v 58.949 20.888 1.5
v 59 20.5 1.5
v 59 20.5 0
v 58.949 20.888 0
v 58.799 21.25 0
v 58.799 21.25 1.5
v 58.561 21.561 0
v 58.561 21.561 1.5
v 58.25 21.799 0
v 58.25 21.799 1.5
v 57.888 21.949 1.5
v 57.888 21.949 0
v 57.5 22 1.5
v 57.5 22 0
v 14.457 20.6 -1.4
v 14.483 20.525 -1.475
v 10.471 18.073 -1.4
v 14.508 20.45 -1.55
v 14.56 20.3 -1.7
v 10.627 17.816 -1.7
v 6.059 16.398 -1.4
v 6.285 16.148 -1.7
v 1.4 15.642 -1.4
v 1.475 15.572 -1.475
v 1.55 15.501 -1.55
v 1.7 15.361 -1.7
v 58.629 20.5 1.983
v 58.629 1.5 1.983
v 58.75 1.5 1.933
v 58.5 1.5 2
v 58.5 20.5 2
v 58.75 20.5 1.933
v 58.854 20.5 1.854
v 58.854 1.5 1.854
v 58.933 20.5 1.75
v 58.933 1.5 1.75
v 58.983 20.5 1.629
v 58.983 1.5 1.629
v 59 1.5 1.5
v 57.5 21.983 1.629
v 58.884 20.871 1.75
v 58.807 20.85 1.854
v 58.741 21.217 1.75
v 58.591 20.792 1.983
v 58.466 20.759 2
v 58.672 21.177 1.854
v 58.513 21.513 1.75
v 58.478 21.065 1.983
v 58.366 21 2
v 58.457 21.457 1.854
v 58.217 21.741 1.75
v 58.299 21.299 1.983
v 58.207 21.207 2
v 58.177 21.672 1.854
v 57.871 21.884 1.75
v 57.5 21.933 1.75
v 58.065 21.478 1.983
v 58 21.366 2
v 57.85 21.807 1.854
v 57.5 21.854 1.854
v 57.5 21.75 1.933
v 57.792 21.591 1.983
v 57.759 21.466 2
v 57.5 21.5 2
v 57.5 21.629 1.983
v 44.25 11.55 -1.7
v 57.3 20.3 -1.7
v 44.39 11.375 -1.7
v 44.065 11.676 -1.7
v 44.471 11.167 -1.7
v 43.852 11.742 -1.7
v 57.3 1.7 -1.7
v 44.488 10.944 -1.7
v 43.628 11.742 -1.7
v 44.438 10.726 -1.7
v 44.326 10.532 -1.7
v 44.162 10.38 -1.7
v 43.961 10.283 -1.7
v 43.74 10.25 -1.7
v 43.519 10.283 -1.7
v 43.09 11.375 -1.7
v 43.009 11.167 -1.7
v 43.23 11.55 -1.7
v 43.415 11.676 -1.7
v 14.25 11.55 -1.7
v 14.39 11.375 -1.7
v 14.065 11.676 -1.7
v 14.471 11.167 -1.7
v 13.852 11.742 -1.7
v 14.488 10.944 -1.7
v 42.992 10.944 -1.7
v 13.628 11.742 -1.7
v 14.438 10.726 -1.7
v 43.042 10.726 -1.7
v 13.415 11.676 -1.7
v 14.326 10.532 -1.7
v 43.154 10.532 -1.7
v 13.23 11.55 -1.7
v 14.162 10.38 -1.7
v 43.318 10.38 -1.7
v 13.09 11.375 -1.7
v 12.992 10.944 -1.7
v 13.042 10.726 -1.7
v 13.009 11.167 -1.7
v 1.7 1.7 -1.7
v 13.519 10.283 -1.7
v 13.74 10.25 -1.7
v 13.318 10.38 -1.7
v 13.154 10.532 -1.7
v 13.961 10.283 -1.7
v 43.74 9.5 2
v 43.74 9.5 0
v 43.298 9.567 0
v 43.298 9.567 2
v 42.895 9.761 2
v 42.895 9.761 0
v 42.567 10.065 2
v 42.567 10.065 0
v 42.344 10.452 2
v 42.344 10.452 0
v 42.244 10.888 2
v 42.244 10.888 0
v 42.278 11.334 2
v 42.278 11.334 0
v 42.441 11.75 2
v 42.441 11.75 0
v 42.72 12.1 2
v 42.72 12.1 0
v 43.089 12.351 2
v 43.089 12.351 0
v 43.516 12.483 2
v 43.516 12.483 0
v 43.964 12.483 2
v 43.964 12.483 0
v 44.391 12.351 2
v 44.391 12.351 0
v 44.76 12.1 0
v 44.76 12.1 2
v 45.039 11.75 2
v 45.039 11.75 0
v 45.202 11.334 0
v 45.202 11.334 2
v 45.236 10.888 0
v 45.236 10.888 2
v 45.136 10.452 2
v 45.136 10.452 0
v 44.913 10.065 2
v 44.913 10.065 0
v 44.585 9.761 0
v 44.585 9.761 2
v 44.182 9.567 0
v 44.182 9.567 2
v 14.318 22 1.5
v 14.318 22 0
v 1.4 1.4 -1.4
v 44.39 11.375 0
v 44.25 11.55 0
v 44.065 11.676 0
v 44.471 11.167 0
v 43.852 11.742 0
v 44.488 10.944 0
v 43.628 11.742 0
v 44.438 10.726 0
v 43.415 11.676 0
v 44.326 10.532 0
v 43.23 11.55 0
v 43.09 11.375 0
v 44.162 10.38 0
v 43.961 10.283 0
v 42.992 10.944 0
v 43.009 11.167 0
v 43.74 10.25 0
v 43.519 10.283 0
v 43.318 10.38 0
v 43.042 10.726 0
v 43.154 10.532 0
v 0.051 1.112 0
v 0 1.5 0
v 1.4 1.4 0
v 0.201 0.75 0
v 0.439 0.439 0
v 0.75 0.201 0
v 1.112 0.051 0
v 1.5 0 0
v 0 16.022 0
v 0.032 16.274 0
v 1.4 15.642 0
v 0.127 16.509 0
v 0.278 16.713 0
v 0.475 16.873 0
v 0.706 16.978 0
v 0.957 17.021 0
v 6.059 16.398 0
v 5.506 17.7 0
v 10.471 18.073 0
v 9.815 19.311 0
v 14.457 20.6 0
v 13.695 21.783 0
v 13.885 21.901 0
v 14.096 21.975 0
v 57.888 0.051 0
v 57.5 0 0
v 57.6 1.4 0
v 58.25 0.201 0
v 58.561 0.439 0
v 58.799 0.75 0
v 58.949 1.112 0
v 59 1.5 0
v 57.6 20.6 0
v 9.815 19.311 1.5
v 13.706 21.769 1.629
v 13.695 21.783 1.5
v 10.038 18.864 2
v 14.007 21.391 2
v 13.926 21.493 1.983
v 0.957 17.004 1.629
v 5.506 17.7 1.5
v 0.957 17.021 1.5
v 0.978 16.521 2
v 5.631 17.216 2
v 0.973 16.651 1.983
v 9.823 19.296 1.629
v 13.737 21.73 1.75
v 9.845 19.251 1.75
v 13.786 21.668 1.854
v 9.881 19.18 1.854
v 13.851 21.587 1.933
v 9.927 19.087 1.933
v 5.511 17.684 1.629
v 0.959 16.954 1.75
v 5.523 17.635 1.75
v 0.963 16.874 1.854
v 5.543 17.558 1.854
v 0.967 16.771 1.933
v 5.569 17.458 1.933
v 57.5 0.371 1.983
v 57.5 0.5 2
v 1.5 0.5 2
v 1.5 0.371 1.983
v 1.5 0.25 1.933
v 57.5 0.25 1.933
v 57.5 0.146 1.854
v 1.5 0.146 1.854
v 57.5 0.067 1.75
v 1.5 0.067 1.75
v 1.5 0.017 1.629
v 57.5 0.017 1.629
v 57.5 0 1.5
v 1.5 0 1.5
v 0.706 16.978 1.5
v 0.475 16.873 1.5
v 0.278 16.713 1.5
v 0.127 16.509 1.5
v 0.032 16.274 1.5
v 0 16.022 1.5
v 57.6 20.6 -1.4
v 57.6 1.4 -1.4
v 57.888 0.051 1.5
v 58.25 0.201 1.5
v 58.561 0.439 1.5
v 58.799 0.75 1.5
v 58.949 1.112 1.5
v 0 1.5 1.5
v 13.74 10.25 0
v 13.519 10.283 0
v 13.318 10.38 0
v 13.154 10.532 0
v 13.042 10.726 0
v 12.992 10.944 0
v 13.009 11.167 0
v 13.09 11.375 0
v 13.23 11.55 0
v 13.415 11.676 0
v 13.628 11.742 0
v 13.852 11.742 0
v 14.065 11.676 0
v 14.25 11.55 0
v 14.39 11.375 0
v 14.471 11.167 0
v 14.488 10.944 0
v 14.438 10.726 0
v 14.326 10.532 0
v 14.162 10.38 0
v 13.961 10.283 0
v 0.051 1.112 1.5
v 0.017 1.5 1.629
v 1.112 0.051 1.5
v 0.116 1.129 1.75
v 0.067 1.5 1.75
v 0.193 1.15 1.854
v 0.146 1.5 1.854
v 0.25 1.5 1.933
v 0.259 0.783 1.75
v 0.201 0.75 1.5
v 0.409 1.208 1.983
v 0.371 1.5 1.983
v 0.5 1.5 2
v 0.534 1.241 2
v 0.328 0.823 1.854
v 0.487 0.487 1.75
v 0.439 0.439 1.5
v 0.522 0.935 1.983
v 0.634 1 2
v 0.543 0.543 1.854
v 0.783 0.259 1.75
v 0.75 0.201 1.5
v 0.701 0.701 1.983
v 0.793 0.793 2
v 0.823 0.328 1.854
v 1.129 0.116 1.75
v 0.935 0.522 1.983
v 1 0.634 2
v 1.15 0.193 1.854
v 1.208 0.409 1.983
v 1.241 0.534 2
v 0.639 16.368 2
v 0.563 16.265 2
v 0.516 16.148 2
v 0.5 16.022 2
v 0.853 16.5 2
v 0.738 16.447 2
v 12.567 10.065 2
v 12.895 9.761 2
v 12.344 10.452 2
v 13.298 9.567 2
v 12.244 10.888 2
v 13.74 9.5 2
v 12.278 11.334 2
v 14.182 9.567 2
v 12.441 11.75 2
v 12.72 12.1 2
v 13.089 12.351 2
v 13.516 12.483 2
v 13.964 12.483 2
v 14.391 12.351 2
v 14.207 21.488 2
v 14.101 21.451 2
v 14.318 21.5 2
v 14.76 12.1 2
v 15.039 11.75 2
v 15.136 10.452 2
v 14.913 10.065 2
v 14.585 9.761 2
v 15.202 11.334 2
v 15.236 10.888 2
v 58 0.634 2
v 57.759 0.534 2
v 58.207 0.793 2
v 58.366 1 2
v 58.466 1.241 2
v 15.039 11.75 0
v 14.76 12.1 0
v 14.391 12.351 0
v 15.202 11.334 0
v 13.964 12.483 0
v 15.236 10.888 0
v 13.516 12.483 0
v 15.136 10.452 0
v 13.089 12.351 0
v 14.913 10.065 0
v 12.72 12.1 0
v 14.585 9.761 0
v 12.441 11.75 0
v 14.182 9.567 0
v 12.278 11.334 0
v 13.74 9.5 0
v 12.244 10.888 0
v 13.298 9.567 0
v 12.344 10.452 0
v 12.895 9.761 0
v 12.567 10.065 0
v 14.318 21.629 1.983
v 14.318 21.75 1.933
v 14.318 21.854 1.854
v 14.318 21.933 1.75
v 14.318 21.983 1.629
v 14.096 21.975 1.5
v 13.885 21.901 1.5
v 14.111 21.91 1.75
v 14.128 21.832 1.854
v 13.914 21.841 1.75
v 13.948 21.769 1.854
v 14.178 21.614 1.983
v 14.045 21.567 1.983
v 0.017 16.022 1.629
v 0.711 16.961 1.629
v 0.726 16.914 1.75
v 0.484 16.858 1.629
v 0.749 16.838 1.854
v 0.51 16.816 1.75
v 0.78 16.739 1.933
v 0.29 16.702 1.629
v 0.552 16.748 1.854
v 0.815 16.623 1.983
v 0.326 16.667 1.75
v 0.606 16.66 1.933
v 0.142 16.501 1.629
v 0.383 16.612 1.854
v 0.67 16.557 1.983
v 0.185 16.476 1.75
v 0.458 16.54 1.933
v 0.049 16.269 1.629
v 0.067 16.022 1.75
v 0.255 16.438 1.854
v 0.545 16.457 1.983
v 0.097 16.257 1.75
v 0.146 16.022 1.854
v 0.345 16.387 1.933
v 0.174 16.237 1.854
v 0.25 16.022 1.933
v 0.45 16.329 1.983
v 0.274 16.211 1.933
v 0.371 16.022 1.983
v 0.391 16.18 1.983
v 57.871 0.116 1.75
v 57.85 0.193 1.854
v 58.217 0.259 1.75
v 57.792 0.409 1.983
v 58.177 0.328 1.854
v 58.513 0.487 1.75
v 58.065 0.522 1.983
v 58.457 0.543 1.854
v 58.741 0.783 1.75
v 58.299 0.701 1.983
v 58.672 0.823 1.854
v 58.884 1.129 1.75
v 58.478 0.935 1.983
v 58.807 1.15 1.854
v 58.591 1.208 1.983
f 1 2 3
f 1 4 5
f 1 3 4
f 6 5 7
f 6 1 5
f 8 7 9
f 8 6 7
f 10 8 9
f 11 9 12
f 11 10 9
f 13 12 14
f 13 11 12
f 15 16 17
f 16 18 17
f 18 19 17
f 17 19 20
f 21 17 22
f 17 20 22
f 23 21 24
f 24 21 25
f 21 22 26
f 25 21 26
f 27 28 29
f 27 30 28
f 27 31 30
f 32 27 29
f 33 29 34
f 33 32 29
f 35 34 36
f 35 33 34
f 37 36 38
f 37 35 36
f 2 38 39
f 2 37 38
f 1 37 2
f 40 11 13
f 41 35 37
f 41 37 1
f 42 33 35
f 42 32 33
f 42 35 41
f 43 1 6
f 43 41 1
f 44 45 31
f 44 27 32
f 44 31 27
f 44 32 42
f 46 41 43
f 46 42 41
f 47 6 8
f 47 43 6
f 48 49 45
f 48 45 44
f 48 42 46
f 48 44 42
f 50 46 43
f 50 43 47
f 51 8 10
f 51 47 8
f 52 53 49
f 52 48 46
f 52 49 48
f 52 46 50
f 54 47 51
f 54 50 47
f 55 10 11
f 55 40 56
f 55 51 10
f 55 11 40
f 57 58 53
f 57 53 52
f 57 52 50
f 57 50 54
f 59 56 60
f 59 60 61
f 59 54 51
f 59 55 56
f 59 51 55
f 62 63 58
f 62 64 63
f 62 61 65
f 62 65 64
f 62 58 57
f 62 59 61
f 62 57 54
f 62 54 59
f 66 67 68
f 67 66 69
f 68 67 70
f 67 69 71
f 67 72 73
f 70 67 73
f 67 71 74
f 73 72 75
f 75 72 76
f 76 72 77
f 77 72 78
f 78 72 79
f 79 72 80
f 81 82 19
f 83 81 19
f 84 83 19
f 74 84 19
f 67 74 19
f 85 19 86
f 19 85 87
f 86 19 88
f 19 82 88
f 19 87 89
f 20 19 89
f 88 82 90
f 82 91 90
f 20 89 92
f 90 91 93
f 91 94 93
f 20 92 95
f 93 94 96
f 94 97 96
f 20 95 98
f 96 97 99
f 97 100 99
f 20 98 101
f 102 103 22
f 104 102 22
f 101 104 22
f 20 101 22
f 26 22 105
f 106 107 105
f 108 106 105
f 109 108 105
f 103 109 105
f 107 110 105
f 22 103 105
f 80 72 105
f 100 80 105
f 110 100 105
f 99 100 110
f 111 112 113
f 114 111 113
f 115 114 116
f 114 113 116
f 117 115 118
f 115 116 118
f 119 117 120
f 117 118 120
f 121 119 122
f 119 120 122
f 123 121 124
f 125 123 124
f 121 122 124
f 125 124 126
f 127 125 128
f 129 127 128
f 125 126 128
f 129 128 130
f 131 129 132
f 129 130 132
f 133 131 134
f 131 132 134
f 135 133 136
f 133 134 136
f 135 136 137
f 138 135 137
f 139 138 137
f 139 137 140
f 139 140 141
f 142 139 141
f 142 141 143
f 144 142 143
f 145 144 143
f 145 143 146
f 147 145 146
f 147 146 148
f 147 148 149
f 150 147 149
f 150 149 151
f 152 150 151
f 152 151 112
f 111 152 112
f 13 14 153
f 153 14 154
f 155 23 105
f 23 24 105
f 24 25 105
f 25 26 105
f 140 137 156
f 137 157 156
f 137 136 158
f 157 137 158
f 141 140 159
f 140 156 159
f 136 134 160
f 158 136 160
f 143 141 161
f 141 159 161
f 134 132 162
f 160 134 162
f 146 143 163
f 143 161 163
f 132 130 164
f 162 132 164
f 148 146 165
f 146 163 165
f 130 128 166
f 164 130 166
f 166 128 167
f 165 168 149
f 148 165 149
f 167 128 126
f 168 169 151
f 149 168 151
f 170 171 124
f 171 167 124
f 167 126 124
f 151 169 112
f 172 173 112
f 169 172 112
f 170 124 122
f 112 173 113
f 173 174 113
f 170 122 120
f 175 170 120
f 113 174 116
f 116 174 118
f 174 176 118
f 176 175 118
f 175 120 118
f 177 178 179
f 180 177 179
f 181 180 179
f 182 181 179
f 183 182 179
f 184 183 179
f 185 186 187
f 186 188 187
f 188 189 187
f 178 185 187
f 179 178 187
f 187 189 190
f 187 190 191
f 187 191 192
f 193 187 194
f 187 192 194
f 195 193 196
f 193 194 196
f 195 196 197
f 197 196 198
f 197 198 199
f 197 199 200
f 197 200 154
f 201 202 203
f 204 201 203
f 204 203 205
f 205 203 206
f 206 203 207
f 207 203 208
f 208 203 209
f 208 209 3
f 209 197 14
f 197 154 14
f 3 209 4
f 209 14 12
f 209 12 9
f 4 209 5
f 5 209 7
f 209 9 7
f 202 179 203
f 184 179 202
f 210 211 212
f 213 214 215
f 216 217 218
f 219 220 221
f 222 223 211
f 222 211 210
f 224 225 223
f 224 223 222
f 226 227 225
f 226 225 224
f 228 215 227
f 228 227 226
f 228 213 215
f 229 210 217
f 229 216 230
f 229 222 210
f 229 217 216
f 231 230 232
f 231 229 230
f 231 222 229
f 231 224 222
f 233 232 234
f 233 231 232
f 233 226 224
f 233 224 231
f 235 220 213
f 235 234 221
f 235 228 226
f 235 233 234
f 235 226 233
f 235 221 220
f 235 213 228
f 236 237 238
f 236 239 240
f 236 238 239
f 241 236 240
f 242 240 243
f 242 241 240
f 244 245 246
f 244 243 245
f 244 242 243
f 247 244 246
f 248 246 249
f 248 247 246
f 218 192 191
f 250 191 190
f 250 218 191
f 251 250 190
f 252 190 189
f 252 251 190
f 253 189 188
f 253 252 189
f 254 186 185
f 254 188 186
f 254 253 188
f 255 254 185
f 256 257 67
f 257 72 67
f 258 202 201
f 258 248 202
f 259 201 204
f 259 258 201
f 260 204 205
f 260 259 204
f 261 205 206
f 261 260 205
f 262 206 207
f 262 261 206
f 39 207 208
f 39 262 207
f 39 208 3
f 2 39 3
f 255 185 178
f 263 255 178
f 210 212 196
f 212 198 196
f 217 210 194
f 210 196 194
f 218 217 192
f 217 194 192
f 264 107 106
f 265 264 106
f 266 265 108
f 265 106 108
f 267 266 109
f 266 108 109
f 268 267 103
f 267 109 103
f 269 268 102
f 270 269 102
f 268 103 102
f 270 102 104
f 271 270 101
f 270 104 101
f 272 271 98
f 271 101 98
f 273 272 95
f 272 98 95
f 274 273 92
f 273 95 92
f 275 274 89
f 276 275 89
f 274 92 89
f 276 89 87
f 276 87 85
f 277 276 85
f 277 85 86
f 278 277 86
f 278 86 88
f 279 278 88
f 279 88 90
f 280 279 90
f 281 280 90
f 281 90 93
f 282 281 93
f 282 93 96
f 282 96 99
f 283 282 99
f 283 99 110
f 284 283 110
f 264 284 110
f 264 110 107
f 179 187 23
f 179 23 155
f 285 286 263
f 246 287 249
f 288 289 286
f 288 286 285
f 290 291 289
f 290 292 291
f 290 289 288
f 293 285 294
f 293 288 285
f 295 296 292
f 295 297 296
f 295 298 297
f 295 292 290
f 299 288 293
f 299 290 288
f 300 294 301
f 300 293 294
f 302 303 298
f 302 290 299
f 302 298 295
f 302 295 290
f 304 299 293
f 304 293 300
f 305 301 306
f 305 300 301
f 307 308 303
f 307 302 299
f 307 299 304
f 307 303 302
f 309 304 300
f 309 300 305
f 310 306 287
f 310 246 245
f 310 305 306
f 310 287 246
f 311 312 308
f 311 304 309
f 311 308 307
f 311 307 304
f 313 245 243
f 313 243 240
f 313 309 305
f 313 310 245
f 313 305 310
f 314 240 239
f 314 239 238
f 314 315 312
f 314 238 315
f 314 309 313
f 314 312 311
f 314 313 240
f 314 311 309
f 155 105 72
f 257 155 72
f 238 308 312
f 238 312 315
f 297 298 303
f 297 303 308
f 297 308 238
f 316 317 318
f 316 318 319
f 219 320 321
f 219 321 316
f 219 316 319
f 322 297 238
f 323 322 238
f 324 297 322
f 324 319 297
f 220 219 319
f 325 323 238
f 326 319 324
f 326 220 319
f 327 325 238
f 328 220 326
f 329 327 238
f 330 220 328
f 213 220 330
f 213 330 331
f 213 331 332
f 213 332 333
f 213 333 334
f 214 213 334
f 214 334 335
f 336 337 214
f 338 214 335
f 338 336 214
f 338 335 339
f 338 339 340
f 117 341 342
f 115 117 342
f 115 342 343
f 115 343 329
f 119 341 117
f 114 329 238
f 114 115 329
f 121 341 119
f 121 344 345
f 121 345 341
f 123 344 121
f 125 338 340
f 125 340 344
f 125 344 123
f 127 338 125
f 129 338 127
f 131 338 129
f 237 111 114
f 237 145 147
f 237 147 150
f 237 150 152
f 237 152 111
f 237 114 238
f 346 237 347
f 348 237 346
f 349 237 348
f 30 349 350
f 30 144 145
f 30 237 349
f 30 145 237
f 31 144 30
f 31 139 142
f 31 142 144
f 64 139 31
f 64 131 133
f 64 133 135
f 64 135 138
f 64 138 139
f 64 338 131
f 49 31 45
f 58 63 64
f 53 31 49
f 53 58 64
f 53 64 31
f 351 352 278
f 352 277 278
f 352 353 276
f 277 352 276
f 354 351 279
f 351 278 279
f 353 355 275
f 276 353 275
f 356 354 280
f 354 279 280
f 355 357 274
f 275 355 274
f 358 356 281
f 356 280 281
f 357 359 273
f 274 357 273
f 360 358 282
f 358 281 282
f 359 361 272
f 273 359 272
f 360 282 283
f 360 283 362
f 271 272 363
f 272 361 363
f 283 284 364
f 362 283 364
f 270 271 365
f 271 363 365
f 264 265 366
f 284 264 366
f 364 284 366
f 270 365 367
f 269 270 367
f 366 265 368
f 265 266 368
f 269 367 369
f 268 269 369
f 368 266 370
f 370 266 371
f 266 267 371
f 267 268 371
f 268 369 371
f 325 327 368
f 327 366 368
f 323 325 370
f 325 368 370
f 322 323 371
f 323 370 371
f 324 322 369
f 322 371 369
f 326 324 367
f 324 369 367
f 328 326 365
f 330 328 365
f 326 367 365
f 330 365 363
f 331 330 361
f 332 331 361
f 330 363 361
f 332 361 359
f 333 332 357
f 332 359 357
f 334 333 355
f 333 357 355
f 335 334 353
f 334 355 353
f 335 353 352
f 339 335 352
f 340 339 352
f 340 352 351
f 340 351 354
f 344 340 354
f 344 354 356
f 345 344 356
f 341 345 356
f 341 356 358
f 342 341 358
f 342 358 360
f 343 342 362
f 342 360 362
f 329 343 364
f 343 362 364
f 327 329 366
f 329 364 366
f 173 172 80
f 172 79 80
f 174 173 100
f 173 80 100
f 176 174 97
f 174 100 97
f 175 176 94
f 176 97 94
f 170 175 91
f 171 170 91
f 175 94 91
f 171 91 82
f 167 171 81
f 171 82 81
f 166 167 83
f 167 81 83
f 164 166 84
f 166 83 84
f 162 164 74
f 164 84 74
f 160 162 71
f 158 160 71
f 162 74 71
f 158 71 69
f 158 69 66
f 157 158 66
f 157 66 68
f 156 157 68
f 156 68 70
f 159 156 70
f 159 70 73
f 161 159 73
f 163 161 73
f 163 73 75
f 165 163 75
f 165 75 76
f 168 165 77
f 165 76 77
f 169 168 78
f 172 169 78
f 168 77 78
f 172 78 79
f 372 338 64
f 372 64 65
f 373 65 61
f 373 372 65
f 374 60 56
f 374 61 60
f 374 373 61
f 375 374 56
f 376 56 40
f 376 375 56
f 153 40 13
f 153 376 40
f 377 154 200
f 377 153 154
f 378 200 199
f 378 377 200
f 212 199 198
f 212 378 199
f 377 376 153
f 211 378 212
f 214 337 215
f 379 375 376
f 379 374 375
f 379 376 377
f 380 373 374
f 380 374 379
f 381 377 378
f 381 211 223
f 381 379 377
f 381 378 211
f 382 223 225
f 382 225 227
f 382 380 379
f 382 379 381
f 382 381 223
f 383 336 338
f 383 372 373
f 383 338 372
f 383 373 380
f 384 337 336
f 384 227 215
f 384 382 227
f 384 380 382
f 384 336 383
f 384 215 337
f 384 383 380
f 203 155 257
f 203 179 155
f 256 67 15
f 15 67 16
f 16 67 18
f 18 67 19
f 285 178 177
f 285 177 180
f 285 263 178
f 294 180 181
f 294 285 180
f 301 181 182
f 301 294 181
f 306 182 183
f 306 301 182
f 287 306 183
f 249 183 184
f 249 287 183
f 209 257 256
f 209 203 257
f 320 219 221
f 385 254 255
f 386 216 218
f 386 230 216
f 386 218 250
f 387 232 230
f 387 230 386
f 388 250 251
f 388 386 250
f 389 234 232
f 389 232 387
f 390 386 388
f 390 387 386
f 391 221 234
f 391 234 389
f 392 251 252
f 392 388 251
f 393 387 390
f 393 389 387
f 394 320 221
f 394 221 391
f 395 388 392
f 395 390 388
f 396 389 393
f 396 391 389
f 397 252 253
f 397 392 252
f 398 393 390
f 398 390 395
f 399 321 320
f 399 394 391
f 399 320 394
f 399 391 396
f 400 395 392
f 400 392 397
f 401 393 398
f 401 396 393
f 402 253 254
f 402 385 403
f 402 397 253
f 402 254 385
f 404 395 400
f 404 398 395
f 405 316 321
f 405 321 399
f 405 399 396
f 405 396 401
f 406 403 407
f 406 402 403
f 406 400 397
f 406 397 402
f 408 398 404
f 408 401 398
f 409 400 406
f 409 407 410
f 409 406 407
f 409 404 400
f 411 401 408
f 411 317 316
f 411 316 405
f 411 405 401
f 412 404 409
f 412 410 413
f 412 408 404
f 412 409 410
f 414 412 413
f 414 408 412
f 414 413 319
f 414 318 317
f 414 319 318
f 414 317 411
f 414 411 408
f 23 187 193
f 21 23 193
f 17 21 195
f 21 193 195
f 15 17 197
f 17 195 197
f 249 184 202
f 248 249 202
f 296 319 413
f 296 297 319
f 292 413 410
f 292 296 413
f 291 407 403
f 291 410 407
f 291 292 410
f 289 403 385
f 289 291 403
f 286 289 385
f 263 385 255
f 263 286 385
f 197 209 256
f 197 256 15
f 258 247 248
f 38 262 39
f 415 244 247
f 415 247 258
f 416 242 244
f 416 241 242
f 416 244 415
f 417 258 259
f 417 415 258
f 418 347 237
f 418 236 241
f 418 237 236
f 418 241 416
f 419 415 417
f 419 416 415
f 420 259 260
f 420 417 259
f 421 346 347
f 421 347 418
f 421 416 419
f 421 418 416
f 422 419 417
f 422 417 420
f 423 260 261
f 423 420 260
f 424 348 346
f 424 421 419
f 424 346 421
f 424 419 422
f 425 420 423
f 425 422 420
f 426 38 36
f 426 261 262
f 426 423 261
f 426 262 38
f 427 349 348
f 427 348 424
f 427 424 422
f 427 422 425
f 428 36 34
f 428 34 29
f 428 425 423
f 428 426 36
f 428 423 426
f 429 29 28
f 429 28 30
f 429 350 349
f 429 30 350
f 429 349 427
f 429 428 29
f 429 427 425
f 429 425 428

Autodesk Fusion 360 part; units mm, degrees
sketch "Esquisse1" plane through (0, 0, 0) normal (0, 0, 1) x (1, 0, 0)
  line L0 (0, 0) -> (59, 0)
  line L1 (59, 0) -> (59, 22)
  line L2 (59, 22) -> (0, 22)
  line L3 (0, 22) -> (0, 0)
  line L4 (0, 0) -> (0, 17) construction
  line L5 (0, 17) -> (0, 39) construction
  arc A0 (0, 17) -> (13.9642, 22) centre (0, 39) ccw
  dimension "d1" = 22
  dimension "d2" = 59
  dimension "d3" = 17
  dimension "d4" = 22
extrude "Extrusion1" add sketch "Esquisse1" along normal blind 2 contours L0 L1 L2 L3 A0
sketch "Esquisse2" plane through (0, 0, 2) normal (0, 0, 1) x (-1, 0, 0)
  line L0 (0, 0) -> (-59, 0)
  line L1 (-59, 0) -> (-59, -22)
  line L2 (-59, -22) -> (-13.9642, -22)
  arc A0 (0, -17) -> (-13.9642, -22) centre (0, -39) ccw
  line L3 (0, -17) -> (0, 0)
  arc A1 (-1.4, -15.6419) -> (-14.4568, -20.6) centre (0, -39) ccw
  line L4 (-57.6, -20.6) -> (-14.4568, -20.6)
  line L5 (-57.6, -1.4) -> (-57.6, -20.6)
  line L6 (-1.4, -1.4) -> (-57.6, -1.4)
  line L7 (-1.4, -15.6419) -> (-1.4, -1.4)
  dimension "d7" = -1.4
extrude "Extrusion11" add sketch "Esquisse2" against normal blind 3.7 contours A1 L4 L5 L6 L7
chamfer "Chanfrein3" distance 0.3 angle 45 5 edges at (29.5, 1.4, -1.7) (1.4, 8.521, -1.7) (8.307, 17.1241, -1.7) (36.0284, 20.6, -1.7) (57.6, 11, -1.7)
fillet "Congé7" radius 1.5 3 edges at (0, 0, 1) (59, 0, 1) (59, 22, 1)
fillet "Congé8" radius 1 2 edges at (13.9642, 22, 1) (0, 17, 1)
fillet "Congé9" radius 0.5 10 edges at (0.4393, 0.4393, 2) (29.5, 0, 2) (58.5607, 0.4393, 2) (59, 11, 2) (58.5607, 21.5607, 2) (35.9089, 22, 2) (13.9881, 21.9441, 2) (7.7031, 18.3927, 2) (0.2777, 16.7133, 2) (0, 8.7609, 2)
hole "Perçage1" at (43.74, 11, 2) direction (0, 0, -1) diameter 1.5 depth 9 tip angle 180 counterbore diameter 3 counterbore depth 2
pattern_linear "Réseau R1" count 2 spacing 30 along (-1, 0, 0) of "Perçage1"
equation "d5 = 2 mm"
equation "d76 = d5"
